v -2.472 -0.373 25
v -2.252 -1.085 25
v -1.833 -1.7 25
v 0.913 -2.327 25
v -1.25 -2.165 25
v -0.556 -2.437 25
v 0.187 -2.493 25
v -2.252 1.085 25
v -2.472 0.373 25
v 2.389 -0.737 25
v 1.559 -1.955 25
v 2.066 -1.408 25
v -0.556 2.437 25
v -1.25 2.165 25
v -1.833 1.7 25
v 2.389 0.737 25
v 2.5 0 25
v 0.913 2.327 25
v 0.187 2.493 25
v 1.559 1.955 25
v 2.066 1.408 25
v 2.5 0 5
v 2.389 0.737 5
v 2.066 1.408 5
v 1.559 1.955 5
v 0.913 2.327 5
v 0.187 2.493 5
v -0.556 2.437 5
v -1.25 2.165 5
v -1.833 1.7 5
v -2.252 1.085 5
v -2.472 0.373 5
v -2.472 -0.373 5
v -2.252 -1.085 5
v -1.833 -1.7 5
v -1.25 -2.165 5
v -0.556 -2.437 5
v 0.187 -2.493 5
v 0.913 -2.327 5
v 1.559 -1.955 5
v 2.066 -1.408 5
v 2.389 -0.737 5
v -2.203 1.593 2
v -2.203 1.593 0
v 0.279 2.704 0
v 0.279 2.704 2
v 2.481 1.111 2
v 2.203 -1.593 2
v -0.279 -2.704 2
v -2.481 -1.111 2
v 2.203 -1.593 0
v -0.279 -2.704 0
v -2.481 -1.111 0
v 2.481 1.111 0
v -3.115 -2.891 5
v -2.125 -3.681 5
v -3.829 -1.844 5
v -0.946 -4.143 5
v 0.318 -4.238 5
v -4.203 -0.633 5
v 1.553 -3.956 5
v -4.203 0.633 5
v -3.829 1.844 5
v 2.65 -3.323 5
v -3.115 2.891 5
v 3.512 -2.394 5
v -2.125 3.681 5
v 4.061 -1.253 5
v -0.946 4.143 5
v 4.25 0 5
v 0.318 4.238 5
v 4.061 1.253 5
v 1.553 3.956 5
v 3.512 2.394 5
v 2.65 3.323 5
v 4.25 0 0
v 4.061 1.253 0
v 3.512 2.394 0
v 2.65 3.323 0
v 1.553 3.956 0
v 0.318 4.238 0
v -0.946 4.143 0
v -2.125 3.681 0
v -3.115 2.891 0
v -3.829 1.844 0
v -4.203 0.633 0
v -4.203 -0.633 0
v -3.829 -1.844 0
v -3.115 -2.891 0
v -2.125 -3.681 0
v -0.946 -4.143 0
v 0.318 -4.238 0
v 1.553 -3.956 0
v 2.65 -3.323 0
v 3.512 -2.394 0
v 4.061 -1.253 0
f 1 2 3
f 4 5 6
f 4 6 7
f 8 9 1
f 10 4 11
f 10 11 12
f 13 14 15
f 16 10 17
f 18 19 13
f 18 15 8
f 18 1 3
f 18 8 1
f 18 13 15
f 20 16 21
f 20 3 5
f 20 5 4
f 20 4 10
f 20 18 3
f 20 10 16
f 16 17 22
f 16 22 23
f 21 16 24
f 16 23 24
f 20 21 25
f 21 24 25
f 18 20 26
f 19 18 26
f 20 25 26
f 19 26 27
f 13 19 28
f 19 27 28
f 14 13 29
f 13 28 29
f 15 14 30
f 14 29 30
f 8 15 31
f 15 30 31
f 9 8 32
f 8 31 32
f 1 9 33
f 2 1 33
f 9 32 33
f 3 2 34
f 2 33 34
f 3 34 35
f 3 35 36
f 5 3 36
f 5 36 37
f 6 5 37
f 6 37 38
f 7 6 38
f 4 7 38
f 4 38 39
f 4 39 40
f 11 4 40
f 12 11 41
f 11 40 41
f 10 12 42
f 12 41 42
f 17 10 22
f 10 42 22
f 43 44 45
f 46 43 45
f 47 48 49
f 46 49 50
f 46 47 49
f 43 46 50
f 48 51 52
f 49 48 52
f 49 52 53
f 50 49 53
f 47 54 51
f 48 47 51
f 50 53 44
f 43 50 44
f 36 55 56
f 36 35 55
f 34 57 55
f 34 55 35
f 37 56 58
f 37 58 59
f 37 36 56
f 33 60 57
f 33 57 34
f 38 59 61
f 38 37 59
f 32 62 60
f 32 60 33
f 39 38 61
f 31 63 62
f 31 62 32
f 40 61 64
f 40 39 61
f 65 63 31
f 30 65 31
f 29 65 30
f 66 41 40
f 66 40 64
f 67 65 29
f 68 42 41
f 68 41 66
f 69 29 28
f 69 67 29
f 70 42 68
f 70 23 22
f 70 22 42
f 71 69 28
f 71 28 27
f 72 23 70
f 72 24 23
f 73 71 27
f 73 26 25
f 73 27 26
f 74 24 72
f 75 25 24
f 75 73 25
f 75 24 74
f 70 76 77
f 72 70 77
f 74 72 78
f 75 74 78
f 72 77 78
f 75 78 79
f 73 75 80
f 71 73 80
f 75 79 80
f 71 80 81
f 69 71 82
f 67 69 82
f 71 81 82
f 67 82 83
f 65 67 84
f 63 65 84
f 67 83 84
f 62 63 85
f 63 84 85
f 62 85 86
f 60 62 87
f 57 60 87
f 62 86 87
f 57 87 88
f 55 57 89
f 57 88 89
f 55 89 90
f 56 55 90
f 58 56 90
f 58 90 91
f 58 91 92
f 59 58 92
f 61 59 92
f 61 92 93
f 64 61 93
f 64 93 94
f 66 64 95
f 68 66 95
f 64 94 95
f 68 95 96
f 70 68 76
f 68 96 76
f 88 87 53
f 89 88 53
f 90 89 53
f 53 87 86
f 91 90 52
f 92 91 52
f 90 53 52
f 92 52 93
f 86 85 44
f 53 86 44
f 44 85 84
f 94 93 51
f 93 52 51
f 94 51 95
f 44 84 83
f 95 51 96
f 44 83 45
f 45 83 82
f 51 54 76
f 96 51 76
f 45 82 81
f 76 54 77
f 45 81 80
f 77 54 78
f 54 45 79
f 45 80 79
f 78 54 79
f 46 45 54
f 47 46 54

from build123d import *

# Parameters (mm, degrees)
SKETCH_1_R          = 4.25
EXTRUDE_1_DEPTH     = 5
SKETCH_2_R          = 2.5
EXTRUDE_2_DEPTH     = 20
CUT_EXTRUDE_1_DEPTH = 2


with BuildPart() as part:
    # ｽｹｯﾁ1 → ﾎﾞｽ - 押し出し1 (new body)
    with BuildSketch(Plane.XY):
        Circle(SKETCH_1_R)
    extrude(amount=EXTRUDE_1_DEPTH)

    # ｽｹｯﾁ2 → ﾎﾞｽ - 押し出し2 (add)
    with BuildSketch(Plane.XY.offset(5)):
        Circle(SKETCH_2_R)
    extrude(amount=EXTRUDE_2_DEPTH)

    # ｽｹｯﾁ3 → ｶｯﾄ - 押し出し1 (cut)
    with BuildSketch(Plane(origin=(0, 0, 0), x_dir=(-1, 0, 0), z_dir=(0, 0, -1))):
        Polygon((2.481247226, -1.110941893), (2.202727514, 1.593352185), (-0.278519712, 2.704294077), (-2.481247226, 1.110941893), (-2.202727514, -1.593352185), (0.278519712, -2.704294077), align=None)
    extrude(amount=-CUT_EXTRUDE_1_DEPTH, mode=Mode.SUBTRACT)


solid = part.part
